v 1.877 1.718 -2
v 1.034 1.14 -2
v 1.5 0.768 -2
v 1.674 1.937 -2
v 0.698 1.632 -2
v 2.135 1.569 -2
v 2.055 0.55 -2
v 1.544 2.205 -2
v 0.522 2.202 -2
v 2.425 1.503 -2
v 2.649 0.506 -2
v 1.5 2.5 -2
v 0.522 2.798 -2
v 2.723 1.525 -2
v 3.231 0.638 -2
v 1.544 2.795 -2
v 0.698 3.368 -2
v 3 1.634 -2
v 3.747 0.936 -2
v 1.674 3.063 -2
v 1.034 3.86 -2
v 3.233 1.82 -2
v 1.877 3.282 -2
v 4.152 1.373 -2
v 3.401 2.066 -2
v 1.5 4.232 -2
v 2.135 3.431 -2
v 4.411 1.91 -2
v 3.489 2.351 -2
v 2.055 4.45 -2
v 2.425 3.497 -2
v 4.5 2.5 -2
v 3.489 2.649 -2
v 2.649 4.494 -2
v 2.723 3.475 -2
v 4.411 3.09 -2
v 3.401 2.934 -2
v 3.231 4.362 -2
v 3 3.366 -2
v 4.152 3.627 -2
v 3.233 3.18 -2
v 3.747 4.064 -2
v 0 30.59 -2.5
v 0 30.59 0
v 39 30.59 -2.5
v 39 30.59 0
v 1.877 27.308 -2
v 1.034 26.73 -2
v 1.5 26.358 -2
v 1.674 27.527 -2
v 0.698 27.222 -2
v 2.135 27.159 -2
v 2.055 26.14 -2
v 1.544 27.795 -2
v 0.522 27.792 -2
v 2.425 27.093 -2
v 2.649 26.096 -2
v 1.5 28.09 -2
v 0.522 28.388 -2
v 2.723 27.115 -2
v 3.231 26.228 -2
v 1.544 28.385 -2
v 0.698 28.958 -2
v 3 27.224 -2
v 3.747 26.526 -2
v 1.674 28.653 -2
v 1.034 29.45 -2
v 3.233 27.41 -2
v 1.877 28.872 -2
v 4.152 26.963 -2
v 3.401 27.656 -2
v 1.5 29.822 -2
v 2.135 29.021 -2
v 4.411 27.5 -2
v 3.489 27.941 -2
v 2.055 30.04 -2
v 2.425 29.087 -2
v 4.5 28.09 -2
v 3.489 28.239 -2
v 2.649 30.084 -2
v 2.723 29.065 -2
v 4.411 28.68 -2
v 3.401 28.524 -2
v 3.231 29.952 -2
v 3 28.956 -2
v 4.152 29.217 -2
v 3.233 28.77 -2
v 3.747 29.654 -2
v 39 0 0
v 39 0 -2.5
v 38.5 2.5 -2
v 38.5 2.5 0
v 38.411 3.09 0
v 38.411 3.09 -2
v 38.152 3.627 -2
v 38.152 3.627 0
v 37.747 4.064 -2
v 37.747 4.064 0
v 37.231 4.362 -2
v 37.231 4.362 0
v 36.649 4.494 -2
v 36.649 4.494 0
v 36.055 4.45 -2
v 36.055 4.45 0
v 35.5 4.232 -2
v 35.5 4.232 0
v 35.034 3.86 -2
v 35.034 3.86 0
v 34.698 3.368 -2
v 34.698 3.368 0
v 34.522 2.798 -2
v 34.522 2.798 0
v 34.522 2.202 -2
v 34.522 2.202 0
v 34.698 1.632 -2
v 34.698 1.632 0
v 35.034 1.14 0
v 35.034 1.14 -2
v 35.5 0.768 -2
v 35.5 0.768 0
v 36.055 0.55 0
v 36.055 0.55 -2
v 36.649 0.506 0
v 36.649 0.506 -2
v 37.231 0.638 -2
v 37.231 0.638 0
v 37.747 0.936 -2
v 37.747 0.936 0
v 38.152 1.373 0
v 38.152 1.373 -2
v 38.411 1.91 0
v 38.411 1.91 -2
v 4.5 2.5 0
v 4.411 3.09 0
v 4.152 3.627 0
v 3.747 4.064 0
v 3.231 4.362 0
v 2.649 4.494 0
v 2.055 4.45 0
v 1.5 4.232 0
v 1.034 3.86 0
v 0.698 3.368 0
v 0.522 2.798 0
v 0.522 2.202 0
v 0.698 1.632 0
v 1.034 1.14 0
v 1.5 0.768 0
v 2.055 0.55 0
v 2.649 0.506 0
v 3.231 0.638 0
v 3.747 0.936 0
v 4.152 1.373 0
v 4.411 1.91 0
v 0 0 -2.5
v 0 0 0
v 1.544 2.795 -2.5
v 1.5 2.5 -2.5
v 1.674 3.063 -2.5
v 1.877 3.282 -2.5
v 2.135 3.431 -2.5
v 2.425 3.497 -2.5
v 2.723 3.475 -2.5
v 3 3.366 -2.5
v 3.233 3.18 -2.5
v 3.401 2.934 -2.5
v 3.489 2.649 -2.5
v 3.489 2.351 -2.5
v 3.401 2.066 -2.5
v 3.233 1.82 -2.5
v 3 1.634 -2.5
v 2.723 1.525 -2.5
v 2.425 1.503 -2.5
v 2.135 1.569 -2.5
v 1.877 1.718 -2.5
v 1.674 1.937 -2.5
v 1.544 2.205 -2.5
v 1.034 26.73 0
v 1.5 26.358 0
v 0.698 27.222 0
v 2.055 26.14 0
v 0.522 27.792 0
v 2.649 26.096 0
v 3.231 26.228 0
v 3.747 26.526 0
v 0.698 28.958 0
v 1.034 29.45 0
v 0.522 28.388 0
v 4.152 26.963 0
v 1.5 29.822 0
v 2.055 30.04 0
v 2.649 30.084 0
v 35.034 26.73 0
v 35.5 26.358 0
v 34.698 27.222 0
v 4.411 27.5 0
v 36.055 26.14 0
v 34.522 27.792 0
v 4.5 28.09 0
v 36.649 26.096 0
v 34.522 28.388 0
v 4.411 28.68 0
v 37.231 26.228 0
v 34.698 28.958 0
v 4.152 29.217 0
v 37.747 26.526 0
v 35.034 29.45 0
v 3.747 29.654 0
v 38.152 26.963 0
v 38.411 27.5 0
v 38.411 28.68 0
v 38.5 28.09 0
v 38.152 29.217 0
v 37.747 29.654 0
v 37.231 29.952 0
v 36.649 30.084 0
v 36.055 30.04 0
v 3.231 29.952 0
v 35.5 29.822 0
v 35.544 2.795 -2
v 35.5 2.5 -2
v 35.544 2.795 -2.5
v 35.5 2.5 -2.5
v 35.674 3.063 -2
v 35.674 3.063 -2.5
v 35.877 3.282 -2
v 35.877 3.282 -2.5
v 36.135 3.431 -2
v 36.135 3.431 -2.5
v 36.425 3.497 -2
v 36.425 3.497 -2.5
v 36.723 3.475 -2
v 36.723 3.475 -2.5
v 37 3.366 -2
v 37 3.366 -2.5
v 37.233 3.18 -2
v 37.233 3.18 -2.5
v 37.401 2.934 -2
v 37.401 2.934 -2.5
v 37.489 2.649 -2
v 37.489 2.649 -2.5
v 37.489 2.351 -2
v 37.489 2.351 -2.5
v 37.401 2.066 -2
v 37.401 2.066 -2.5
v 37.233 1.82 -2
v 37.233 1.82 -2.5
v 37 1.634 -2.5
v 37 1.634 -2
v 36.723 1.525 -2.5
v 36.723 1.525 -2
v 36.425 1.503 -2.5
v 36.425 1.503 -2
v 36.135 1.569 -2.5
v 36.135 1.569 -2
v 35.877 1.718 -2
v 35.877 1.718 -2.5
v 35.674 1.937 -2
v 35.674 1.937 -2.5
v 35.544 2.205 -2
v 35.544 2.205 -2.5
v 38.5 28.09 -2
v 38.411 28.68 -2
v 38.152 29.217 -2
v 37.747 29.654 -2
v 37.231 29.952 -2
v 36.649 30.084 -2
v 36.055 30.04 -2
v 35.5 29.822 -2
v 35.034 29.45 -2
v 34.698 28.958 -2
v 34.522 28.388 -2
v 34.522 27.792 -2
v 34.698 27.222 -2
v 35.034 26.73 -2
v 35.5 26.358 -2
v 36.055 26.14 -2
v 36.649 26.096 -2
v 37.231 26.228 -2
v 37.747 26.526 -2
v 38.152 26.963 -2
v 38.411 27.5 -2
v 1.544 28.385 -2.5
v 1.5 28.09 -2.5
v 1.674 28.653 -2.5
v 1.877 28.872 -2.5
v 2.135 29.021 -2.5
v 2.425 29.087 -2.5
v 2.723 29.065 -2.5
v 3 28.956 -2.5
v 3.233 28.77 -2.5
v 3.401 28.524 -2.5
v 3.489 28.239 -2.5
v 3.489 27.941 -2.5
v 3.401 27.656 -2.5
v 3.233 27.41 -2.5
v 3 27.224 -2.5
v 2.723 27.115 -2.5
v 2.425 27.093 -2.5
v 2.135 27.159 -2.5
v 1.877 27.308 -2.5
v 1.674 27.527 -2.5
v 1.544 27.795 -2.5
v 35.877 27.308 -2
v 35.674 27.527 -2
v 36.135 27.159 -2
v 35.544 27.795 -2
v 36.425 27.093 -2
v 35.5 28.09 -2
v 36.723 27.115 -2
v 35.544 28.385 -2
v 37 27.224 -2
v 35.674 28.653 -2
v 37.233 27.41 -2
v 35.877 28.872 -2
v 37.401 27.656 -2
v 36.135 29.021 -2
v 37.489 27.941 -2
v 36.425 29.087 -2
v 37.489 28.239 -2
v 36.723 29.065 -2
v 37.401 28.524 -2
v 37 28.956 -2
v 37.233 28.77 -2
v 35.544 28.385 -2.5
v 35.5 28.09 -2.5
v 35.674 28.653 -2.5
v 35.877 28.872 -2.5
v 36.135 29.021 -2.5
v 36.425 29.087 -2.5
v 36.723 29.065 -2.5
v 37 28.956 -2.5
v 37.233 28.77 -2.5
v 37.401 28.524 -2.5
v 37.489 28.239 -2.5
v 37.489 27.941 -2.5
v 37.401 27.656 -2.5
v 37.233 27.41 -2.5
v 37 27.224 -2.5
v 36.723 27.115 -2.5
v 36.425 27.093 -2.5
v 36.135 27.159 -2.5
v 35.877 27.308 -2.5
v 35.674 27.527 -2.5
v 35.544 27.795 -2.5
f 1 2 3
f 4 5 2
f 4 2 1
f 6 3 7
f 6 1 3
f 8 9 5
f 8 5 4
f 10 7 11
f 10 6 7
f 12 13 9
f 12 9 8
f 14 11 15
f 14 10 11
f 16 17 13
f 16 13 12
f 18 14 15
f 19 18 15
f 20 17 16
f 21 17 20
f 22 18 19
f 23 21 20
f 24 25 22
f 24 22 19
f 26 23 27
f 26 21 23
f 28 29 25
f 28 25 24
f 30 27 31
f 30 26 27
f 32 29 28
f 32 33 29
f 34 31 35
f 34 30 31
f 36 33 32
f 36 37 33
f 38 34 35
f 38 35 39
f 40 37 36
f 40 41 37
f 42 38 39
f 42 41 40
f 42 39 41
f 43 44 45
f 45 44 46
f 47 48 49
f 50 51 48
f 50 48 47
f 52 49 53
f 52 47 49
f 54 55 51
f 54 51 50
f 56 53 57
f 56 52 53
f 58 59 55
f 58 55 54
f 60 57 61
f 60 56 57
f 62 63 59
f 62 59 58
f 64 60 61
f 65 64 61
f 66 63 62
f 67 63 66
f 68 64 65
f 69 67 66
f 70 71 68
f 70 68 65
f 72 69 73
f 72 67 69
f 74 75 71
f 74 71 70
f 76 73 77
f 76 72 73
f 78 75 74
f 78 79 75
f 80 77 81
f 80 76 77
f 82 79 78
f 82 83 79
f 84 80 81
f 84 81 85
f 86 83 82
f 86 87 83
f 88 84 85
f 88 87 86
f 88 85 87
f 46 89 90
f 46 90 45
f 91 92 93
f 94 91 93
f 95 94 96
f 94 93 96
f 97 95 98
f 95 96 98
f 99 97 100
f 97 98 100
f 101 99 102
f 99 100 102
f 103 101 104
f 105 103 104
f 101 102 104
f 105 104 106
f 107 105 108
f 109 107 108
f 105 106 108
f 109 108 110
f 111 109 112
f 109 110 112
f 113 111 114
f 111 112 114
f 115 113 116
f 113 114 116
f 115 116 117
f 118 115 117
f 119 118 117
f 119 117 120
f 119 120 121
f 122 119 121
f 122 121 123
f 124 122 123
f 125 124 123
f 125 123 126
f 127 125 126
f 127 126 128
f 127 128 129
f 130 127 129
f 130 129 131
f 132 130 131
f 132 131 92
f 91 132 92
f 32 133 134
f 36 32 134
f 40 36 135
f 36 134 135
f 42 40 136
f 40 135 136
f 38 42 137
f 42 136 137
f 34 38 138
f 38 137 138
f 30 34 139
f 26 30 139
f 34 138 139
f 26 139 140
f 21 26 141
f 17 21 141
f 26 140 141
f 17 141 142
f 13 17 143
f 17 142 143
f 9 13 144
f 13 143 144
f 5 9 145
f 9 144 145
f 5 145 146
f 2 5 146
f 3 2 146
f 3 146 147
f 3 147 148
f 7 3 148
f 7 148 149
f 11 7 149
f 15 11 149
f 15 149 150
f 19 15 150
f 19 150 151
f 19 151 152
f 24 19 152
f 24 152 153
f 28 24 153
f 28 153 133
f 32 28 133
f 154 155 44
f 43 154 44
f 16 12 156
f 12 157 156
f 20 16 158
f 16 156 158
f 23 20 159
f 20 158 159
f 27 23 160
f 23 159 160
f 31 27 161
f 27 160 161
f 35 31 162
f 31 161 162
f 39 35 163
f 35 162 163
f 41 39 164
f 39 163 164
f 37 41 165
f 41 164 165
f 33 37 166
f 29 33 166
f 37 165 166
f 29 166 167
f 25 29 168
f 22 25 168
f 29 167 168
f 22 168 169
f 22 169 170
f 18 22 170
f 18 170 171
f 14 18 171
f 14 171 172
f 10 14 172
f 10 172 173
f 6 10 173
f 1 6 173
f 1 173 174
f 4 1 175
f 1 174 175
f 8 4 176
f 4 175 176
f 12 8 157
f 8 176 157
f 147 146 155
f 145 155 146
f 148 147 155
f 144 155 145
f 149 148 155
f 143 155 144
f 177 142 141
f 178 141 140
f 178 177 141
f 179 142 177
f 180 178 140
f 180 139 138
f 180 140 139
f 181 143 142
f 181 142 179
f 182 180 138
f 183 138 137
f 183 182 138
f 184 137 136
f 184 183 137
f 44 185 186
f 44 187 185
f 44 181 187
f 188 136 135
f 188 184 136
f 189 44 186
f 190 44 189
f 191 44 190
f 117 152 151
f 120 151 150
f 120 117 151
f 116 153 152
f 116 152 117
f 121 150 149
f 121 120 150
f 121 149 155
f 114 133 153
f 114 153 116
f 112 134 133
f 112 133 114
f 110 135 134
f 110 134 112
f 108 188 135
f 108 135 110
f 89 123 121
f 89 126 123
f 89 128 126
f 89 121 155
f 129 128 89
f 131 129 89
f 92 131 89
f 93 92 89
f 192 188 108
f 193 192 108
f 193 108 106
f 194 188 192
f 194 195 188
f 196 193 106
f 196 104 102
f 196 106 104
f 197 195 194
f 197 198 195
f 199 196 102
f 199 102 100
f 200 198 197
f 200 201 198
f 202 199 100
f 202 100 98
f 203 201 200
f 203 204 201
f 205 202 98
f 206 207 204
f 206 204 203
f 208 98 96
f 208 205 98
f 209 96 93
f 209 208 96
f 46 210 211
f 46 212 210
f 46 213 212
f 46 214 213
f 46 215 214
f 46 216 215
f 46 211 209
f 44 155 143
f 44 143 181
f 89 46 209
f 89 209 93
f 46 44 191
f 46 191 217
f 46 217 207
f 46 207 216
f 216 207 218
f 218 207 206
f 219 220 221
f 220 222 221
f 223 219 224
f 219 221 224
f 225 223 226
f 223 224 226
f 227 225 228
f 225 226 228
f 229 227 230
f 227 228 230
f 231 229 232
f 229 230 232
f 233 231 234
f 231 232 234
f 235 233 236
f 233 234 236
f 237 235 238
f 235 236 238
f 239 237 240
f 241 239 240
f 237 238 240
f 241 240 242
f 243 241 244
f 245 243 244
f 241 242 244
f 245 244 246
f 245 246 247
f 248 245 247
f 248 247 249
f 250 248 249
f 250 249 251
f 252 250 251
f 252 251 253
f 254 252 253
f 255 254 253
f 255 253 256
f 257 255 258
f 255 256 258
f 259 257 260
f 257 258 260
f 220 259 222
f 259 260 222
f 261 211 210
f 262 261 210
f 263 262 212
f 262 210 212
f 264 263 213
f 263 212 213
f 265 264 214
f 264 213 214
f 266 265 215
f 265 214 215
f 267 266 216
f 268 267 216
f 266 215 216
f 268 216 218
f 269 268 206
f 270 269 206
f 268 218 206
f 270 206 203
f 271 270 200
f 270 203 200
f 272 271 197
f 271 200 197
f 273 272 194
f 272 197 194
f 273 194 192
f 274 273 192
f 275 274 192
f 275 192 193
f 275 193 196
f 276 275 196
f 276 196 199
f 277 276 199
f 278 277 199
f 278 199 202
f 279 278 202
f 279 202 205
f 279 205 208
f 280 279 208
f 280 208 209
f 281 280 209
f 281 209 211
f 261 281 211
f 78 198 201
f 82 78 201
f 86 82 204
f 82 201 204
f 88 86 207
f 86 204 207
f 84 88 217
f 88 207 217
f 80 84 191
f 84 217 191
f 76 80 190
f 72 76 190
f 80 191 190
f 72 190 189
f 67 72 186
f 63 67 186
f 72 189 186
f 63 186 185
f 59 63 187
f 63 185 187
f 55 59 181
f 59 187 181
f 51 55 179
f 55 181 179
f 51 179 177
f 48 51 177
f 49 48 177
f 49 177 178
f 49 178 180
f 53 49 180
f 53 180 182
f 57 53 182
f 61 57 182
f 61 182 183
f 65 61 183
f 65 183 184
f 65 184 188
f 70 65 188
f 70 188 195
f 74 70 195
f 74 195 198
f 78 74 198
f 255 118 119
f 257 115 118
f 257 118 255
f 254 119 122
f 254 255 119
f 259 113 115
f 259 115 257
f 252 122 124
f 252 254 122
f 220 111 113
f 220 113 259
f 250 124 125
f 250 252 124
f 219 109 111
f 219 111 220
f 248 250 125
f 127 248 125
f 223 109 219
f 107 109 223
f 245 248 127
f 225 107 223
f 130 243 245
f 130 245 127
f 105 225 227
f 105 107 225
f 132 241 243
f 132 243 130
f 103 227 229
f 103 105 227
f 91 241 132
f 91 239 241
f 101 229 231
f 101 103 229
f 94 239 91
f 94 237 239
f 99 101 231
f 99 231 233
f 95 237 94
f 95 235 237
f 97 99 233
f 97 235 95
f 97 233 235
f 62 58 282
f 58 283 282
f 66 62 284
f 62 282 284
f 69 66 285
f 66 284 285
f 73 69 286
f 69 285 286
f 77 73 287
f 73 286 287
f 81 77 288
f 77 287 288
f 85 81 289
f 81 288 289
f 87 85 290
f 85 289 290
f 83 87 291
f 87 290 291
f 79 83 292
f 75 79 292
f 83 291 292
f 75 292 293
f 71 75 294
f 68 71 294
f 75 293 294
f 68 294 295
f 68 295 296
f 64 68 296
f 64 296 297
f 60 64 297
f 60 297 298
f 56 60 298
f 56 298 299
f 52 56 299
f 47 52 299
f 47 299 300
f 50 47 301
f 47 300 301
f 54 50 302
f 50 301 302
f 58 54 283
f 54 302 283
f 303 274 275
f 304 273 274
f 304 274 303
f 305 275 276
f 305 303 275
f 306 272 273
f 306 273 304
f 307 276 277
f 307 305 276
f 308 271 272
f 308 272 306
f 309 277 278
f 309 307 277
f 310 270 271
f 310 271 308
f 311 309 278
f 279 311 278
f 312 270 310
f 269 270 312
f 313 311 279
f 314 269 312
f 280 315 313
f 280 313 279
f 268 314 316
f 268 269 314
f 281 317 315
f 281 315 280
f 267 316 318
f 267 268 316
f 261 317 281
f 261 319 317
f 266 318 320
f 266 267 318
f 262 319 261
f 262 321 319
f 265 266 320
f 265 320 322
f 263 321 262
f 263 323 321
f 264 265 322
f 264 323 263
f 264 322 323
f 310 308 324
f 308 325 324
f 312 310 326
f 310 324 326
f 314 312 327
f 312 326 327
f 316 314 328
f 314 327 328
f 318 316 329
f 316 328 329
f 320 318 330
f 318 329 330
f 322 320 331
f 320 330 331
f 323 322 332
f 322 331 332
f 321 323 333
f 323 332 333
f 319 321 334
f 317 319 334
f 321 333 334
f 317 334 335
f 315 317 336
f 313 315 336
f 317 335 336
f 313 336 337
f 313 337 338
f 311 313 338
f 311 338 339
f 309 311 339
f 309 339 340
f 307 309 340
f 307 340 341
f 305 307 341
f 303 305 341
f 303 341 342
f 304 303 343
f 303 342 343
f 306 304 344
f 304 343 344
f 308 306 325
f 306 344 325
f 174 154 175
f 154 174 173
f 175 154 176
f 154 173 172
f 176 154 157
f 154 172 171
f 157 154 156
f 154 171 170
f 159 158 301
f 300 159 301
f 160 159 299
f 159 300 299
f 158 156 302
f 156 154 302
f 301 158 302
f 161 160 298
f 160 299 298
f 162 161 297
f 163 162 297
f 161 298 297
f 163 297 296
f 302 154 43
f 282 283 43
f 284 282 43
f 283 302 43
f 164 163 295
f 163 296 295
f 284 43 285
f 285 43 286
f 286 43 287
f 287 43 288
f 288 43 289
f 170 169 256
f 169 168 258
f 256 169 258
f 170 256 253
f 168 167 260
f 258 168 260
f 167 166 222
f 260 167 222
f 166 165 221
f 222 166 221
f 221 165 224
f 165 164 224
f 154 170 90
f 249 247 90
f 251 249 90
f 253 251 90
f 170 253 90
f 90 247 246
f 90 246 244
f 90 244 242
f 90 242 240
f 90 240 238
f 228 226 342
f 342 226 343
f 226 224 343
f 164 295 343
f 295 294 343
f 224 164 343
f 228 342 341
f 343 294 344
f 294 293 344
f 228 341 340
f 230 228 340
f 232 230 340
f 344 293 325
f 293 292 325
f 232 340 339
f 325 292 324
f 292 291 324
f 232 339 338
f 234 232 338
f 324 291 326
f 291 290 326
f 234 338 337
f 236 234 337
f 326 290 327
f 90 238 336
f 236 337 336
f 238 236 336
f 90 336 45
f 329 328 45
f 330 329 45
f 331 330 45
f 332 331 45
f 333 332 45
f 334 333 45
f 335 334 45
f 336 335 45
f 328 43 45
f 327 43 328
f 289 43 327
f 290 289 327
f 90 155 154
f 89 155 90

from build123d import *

# Parameters (mm, degrees)
SKETCH_1_W                   = 39
SKETCH_1_H                   = 30.59
EXTRUDE_1_DEPTH              = 2.5
SKETCH_2_W                   = 5
SKETCH_2_H                   = 5
EXTRUDE_2_DEPTH              = 2.5
HOLE_WIZARD_M2_8_D           = 2
HOLE_WIZARD_M2_8_DEPTH       = 3
HOLE_WIZARD_M2_8_CBORE_D     = 4
HOLE_WIZARD_M2_8_CBORE_DEPTH = 2
HOLE_WIZARD_M2_7_D           = 2
HOLE_WIZARD_M2_7_DEPTH       = 3
HOLE_WIZARD_M2_7_CBORE_D     = 4
HOLE_WIZARD_M2_7_CBORE_DEPTH = 2


with BuildPart() as part:
    # 草图1 → 凸台-拉伸1 (new body)
    with BuildSketch(Plane.XY):
        with Locations((19.5, 15.295)):
            Rectangle(SKETCH_1_W, SKETCH_1_H)
    extrude(amount=-EXTRUDE_1_DEPTH)

    # 草图2 → 凸台-拉伸2 (add)
    with BuildSketch(Plane.XY):
        with Locations((2.5, 2.5)):
            Rectangle(SKETCH_2_W, SKETCH_2_H)
        with Locations((36.5, 28.09)):
            Rectangle(SKETCH_2_W, SKETCH_2_H)
    extrude(amount=-EXTRUDE_2_DEPTH)

    # M2 六角头螺栓的柱形沉头孔8
    with Locations(Plane(origin=(2.5, 2.5, 0), x_dir=(1, 0, 0), z_dir=(0, 0, 1))):
        with Locations((0, 0), (34, 25.59)):
            CounterBoreHole(HOLE_WIZARD_M2_8_D / 2, HOLE_WIZARD_M2_8_CBORE_D / 2, HOLE_WIZARD_M2_8_CBORE_DEPTH, depth=HOLE_WIZARD_M2_8_DEPTH)

    # M2 六角头螺栓的柱形沉头孔7
    with Locations(Plane.XY):
        with Locations((2.5, 28.09), (36.5, 2.5)):
            CounterBoreHole(HOLE_WIZARD_M2_7_D / 2, HOLE_WIZARD_M2_7_CBORE_D / 2, HOLE_WIZARD_M2_7_CBORE_DEPTH, depth=HOLE_WIZARD_M2_7_DEPTH)


solid = part.part
